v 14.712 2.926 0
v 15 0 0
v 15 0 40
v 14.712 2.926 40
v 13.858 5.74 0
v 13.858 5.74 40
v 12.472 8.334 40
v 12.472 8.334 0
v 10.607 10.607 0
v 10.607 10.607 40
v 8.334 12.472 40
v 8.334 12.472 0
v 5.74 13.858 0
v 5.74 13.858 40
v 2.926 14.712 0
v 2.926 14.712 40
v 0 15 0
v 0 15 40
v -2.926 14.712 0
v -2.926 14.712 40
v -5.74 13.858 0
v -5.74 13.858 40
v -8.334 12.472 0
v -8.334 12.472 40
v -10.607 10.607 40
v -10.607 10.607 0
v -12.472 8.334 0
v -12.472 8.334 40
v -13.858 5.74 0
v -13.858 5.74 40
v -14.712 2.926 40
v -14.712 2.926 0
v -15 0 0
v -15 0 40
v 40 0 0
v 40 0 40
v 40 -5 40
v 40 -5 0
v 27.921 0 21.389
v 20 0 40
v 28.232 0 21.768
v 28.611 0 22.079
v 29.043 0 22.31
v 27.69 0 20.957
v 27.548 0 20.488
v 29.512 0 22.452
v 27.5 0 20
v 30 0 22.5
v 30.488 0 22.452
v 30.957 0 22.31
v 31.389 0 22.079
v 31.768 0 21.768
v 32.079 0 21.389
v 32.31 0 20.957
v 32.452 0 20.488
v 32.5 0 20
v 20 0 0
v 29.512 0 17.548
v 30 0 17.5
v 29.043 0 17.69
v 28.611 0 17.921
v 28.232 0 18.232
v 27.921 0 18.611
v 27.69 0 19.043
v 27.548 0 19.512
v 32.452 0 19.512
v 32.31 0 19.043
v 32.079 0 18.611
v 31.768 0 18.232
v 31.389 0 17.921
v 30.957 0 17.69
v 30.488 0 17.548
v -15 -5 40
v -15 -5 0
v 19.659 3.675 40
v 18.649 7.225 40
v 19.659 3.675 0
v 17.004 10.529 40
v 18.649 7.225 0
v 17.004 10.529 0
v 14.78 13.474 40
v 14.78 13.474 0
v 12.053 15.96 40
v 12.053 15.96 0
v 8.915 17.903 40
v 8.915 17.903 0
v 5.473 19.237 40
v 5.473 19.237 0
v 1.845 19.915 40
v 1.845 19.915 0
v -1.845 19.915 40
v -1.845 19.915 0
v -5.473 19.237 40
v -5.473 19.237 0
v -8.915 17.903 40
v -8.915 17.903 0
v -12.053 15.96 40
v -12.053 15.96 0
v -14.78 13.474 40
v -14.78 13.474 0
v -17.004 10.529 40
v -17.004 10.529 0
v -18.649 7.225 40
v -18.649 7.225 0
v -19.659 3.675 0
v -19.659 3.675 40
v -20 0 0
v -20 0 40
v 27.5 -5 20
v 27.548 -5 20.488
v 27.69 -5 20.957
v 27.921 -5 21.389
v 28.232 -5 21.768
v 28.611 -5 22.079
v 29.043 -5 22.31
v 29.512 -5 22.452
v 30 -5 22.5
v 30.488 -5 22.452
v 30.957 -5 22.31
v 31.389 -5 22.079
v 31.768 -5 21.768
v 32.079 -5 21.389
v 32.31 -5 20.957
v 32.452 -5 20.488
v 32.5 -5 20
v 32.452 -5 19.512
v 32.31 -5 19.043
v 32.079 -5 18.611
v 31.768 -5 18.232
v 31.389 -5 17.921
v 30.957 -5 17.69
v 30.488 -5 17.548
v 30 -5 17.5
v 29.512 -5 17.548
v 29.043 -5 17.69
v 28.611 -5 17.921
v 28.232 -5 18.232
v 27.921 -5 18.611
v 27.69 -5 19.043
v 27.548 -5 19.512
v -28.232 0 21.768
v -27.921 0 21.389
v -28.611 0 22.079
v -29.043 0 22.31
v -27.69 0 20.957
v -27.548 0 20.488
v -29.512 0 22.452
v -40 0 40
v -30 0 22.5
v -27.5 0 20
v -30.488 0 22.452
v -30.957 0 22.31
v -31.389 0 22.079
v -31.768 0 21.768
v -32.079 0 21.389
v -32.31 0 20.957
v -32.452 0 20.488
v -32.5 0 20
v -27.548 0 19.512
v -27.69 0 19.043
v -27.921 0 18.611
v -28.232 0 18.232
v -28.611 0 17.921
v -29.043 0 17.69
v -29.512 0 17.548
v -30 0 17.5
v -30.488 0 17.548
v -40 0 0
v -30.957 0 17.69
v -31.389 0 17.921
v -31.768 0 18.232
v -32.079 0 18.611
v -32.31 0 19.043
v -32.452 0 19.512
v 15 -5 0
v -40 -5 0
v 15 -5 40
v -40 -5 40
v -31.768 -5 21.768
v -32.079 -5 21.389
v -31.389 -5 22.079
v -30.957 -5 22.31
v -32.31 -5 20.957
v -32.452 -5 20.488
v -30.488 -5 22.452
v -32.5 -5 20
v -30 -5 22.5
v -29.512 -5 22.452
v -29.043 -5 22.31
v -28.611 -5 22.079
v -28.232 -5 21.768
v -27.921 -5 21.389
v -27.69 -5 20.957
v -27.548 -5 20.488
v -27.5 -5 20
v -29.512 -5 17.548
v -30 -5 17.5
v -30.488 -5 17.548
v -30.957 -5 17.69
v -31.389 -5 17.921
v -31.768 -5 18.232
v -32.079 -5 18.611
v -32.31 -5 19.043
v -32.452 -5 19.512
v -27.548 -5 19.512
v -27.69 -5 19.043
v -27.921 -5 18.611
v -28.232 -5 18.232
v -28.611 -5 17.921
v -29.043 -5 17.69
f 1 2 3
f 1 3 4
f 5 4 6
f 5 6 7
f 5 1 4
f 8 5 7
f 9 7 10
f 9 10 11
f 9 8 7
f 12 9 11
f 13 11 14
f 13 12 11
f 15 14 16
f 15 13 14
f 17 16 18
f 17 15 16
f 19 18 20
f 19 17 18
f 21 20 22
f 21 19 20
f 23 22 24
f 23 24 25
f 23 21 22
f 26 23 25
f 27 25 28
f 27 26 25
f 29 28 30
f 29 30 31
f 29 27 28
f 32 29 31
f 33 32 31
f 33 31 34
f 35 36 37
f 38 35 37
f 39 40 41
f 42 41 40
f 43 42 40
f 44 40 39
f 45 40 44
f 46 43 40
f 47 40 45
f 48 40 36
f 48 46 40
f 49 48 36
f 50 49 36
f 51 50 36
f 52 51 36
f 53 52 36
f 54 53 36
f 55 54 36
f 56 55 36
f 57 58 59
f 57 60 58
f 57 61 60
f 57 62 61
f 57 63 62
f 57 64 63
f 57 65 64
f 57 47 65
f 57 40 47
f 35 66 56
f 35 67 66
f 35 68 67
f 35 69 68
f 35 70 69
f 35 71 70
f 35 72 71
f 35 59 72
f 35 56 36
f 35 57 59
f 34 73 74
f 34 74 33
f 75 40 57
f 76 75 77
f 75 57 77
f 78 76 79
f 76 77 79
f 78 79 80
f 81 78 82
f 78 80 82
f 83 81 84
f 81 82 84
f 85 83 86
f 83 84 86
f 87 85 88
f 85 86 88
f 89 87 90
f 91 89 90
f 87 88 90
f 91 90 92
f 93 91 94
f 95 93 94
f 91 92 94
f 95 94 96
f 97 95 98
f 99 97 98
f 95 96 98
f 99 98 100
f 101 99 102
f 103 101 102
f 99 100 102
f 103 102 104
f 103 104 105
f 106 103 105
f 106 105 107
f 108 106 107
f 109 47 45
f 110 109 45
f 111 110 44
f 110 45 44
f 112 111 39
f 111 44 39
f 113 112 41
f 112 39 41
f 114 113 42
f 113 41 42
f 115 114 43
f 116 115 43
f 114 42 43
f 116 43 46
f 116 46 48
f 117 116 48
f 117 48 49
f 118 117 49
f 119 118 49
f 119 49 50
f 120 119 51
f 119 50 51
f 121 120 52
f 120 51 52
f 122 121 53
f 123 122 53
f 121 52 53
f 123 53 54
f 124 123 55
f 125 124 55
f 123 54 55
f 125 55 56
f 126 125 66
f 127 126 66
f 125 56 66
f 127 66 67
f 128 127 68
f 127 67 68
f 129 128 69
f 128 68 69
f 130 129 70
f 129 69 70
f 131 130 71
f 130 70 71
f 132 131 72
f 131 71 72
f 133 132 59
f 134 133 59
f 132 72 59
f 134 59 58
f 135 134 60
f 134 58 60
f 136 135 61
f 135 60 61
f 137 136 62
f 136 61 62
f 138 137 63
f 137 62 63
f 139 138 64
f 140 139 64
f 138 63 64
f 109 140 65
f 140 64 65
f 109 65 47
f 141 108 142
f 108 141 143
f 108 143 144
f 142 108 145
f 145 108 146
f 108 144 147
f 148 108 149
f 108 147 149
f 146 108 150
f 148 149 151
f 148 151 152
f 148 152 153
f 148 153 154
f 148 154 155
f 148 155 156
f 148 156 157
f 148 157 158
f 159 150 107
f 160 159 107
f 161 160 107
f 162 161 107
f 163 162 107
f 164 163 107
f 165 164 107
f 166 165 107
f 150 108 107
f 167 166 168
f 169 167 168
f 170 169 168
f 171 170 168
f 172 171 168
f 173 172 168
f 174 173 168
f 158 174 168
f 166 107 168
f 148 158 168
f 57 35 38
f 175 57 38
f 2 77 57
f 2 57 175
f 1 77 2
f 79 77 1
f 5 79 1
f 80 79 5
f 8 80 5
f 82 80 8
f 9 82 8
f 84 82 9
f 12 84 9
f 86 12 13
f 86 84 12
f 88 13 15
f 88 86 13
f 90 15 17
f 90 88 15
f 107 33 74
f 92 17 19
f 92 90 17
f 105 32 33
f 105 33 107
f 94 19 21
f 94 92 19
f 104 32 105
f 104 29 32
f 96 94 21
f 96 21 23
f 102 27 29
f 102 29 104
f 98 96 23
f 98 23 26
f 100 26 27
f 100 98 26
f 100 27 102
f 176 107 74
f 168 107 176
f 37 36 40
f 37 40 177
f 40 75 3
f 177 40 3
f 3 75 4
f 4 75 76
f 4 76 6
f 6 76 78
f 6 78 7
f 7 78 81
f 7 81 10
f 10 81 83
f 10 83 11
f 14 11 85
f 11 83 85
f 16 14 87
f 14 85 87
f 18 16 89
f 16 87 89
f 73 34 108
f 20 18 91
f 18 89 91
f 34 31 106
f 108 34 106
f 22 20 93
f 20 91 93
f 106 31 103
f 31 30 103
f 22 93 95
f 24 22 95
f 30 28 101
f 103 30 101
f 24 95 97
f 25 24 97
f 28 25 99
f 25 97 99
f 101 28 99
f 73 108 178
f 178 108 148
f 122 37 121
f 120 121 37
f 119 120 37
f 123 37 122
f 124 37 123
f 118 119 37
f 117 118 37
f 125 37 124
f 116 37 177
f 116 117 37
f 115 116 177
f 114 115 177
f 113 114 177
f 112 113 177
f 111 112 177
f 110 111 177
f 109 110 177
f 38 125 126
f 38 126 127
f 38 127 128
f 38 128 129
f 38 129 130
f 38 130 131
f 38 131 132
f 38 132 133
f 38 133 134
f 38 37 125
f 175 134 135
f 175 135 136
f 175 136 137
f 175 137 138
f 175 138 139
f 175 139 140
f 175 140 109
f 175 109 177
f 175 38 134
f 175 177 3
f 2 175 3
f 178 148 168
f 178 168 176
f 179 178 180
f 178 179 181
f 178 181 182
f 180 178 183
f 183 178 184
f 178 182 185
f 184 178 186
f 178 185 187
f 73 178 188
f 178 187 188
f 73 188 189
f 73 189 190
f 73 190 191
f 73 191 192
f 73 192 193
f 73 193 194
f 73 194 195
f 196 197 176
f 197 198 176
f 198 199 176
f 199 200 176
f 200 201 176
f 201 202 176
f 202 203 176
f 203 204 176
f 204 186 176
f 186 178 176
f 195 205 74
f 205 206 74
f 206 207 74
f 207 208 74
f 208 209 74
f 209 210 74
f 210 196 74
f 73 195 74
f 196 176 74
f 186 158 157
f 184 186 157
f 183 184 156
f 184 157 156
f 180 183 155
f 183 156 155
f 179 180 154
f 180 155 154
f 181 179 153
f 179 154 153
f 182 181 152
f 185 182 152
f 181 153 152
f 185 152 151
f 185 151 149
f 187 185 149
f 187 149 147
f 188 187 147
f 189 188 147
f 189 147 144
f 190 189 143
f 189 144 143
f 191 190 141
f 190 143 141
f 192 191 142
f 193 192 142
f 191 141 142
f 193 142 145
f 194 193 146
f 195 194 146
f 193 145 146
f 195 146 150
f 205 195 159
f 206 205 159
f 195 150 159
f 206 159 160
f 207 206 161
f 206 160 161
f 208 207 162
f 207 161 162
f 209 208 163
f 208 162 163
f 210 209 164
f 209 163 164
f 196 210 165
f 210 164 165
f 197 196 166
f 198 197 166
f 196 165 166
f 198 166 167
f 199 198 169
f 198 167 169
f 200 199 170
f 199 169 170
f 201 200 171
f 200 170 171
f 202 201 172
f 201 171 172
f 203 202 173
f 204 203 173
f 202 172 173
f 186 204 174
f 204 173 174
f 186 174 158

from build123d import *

# Parameters (mm, degrees)
PAD_DEPTH    = 40
SKETCH001_R  = 2.5
POCKET_DEPTH = 5


with BuildPart() as part:
    # Sketch → Pad (new body)
    with BuildSketch(Plane.XY):
        with BuildLine():
            ThreePointArc((15, 0), (0, 15), (-15, 0))
            Line((-15, -5), (-15, 0))
            Line((-40, -5), (-15, -5))
            Line((-40, 0), (-40, -5))
            Line((-20, 0), (-40, 0))
            ThreePointArc((20, 0), (0, 20), (-20, 0))
            Line((20, 0), (40, 0))
            Line((40, 0), (40, -5))
            Line((40, -5), (15, -5))
            Line((15, -5), (15, 0))
        make_face()
    extrude(amount=PAD_DEPTH)

    # Sketch001 (on Face1 of Pad) → Pocket (cut)
    with BuildSketch(Plane(origin=(0, 0, 0), x_dir=(-1, 0, 0), z_dir=(0, 1, 0))):
        with Locations((-30, 20)):
            Circle(SKETCH001_R)
        with Locations((30, 20)):
            Circle(SKETCH001_R)
    extrude(amount=-POCKET_DEPTH, mode=Mode.SUBTRACT)


solid = part.part
